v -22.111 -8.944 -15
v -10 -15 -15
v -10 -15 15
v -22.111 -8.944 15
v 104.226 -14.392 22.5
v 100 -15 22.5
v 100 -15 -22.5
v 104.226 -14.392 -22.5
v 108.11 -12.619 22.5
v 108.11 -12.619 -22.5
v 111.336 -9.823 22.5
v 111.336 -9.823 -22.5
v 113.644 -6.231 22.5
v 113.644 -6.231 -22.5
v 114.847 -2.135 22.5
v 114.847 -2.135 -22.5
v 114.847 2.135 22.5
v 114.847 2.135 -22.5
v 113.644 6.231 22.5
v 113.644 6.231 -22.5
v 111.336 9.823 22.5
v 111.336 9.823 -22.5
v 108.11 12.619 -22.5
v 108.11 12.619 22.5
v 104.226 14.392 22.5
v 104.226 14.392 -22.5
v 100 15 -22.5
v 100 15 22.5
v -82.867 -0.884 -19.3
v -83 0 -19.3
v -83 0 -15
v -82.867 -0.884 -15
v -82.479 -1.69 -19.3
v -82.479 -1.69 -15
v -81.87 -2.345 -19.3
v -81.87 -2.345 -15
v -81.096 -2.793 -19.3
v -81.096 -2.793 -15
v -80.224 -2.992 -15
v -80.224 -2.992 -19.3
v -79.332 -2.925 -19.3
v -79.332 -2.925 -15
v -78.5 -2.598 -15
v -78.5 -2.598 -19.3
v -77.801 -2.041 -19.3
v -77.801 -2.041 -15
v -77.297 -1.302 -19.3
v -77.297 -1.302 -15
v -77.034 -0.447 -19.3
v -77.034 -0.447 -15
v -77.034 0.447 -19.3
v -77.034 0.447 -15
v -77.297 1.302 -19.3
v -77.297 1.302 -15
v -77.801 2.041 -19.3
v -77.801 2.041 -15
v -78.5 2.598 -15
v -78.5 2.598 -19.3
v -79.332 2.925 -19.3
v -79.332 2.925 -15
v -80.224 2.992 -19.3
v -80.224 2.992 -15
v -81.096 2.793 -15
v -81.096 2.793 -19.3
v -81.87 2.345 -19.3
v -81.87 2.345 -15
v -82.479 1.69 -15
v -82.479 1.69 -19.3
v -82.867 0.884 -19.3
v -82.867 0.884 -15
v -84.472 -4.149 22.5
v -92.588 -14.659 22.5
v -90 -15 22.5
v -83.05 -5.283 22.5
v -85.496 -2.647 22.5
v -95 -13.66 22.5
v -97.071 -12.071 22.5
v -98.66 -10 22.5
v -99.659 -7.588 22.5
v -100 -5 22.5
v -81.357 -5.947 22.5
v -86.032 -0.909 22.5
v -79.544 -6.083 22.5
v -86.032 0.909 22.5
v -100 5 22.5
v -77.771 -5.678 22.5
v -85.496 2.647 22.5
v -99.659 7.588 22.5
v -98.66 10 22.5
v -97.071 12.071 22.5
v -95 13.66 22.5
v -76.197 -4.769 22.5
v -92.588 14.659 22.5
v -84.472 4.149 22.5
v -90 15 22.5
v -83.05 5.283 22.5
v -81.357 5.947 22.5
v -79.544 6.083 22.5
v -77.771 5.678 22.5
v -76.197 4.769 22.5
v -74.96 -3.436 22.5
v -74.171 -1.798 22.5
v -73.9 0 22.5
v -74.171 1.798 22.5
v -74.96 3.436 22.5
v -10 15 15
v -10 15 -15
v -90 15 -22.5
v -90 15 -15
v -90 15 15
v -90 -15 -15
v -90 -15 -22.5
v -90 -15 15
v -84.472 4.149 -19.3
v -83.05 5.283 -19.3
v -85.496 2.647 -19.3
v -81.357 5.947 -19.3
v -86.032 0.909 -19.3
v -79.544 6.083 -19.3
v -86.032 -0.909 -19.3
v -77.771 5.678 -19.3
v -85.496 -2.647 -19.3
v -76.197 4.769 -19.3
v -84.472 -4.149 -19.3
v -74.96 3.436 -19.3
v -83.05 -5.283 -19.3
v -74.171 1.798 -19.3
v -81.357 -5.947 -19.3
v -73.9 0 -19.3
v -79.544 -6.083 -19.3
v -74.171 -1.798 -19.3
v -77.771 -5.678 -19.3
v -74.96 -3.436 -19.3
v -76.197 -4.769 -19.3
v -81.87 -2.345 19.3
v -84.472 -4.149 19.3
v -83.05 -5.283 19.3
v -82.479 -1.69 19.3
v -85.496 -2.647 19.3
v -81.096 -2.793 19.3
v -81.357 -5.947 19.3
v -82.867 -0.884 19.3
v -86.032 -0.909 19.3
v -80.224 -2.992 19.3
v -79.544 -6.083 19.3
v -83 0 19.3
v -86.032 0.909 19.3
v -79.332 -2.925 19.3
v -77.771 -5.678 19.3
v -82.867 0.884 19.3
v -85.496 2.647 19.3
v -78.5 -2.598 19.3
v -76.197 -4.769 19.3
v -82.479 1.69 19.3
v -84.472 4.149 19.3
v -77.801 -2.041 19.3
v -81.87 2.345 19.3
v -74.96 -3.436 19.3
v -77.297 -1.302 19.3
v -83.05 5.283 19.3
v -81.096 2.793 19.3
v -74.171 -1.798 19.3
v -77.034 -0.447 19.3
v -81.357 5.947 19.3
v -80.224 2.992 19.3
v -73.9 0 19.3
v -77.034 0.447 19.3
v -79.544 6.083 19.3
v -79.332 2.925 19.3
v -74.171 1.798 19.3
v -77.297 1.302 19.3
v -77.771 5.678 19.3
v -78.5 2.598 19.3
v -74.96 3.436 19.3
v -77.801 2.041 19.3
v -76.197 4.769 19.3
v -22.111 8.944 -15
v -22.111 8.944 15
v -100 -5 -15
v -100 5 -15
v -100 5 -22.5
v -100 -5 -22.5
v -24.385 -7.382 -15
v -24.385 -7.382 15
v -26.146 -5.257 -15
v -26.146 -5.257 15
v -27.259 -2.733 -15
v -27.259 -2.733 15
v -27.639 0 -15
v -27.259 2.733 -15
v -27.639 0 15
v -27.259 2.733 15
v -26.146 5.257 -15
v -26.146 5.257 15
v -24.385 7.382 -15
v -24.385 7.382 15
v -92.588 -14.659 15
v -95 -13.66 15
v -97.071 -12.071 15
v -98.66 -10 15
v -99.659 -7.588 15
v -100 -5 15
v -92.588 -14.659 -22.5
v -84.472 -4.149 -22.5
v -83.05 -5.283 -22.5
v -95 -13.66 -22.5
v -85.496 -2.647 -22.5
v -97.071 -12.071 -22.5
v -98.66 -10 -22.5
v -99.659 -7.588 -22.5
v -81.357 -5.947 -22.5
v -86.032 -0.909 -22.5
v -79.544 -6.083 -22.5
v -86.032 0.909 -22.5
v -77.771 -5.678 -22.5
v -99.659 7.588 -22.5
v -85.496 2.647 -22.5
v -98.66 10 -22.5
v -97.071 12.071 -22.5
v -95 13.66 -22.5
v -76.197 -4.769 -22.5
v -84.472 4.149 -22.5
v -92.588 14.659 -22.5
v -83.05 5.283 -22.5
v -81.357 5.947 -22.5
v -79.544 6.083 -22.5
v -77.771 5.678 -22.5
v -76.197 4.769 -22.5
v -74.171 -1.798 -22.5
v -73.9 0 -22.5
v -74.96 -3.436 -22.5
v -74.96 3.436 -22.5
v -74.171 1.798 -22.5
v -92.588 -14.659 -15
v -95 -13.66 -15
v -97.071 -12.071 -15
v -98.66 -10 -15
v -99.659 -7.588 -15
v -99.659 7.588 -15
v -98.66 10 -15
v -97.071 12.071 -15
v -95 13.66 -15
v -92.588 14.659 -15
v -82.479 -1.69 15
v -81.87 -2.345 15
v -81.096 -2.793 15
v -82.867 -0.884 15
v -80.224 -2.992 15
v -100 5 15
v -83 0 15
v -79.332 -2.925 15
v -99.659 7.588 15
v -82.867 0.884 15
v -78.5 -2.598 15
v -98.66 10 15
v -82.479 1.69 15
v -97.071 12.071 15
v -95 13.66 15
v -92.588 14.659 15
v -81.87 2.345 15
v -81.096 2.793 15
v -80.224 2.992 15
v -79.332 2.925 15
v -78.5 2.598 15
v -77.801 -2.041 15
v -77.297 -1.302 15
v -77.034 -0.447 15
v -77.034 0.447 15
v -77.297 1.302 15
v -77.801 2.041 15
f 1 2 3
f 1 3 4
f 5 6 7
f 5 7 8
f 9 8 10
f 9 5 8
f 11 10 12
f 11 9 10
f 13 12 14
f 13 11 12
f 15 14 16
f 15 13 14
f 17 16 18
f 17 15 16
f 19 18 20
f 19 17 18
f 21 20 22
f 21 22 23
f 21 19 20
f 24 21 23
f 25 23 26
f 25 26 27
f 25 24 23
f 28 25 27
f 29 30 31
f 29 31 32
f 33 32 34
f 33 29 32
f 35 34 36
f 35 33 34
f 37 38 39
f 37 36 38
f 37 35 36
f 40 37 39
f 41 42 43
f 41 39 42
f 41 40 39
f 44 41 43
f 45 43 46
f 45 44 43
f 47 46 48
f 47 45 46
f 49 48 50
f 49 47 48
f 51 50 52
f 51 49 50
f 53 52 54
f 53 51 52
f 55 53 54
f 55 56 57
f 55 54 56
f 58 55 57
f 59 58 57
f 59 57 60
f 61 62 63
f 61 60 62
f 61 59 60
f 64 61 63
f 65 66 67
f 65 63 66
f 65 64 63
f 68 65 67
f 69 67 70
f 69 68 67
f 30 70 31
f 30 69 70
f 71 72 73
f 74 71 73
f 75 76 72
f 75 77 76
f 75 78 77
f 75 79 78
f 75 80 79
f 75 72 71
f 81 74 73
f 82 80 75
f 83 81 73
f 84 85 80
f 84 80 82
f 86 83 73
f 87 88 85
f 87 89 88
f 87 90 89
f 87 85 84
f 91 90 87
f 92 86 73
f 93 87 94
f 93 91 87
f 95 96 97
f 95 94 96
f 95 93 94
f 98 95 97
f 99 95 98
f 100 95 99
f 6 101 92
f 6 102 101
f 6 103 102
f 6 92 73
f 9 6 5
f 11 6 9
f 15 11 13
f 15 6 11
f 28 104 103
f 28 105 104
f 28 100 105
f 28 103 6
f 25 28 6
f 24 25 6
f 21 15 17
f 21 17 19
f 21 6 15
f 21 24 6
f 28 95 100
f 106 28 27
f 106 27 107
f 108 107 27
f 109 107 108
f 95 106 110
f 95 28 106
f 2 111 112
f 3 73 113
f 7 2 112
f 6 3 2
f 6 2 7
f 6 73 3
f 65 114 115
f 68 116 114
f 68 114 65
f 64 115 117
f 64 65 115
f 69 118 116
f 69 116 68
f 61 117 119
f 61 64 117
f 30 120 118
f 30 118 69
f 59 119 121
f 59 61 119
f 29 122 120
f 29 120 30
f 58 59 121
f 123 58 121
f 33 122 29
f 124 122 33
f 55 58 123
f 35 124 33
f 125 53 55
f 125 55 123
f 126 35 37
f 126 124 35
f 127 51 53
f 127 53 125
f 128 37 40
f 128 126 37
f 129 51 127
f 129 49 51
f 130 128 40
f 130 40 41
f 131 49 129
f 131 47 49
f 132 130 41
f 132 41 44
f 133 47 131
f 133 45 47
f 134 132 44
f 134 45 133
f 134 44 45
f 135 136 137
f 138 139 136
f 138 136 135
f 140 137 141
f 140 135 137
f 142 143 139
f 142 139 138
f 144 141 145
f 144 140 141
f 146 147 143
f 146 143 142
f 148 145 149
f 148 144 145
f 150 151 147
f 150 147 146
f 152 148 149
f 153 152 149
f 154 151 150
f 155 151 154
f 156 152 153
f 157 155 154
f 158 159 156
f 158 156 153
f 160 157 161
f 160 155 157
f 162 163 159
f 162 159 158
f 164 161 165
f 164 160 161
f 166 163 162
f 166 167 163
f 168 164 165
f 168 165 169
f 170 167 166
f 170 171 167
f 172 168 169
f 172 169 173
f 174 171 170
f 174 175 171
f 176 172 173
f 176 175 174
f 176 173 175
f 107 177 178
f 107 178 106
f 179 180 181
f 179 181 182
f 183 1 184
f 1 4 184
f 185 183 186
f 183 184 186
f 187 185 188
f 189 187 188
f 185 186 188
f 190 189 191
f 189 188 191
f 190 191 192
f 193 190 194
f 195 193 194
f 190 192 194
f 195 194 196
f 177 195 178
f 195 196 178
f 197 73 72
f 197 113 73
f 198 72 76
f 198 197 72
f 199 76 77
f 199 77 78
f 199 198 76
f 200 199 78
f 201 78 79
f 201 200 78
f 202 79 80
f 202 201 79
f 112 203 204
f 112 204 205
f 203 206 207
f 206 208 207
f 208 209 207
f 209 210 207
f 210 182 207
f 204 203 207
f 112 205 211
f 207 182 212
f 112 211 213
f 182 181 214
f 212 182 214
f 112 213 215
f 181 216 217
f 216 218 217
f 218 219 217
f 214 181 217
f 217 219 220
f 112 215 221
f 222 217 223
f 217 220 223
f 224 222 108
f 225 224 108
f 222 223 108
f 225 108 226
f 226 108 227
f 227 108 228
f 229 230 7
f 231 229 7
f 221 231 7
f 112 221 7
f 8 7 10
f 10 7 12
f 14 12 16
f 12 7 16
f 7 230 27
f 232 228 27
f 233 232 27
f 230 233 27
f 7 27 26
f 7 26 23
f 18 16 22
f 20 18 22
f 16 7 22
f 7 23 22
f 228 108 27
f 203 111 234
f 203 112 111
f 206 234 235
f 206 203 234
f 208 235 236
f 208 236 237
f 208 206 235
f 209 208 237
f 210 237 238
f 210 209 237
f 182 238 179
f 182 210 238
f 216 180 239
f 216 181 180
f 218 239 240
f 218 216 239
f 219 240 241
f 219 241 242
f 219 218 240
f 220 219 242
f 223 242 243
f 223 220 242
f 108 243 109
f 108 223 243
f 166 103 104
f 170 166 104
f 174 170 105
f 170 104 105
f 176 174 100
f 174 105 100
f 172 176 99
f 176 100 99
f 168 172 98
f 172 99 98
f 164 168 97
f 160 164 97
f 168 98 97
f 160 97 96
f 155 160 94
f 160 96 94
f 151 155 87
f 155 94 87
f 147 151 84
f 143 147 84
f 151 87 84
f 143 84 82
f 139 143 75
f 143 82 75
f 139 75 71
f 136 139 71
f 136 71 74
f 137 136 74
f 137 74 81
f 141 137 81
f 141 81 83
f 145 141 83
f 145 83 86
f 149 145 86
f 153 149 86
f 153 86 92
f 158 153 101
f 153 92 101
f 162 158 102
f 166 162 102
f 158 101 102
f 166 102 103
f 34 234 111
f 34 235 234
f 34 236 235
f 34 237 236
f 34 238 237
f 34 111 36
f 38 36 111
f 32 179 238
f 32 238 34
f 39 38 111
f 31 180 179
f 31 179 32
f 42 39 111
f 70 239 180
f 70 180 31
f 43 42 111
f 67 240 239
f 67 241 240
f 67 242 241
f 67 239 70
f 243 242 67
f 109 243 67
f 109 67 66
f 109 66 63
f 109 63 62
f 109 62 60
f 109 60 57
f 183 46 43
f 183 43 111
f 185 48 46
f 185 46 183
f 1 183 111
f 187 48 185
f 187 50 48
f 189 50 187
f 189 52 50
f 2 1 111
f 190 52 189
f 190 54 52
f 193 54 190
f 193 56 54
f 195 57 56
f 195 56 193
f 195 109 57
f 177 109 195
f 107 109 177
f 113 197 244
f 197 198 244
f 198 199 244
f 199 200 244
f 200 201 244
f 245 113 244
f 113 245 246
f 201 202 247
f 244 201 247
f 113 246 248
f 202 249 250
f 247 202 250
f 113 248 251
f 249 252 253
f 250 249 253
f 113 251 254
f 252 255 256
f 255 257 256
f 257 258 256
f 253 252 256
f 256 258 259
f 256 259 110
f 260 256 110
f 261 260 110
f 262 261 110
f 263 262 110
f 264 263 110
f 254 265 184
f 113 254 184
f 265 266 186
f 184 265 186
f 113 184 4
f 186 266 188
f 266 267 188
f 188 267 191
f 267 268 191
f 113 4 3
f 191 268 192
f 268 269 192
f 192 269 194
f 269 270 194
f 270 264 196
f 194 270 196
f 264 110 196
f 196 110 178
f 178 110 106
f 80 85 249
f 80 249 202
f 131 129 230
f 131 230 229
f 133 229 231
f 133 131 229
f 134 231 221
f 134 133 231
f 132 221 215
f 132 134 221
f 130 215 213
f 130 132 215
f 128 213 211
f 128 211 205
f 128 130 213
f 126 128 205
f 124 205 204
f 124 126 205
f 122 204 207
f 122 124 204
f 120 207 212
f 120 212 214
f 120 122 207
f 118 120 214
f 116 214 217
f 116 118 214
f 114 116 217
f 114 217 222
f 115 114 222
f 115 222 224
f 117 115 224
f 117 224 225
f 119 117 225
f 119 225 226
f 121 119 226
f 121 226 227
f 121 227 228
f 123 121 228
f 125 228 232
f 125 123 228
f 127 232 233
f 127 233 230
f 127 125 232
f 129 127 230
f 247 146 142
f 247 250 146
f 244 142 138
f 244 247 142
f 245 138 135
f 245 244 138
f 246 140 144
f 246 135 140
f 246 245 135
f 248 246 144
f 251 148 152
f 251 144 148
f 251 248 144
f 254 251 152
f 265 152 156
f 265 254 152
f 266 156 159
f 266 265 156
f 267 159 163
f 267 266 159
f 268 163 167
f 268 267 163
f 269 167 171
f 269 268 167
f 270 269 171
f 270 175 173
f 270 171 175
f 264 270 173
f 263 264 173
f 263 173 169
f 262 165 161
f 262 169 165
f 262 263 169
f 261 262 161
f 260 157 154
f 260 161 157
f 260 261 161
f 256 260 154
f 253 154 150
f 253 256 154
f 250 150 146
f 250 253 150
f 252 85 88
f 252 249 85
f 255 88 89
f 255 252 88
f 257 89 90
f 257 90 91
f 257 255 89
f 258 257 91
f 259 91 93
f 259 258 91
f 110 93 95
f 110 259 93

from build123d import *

# Parameters (mm, degrees)
SKETCH1_R           = 3
BOSS_EXTRUDE1_DEPTH = 22.5
SKETCH3_W           = 60
SKETCH3_H           = 30
CUT_EXTRUDE1_DEPTH  = 121.959704034
FILLET1_R           = 10
CUT_EXTRUDE2_DEPTH  = 30
CUT_EXTRUDE4_DEPTH  = 30
FILLET2_R           = 10
SKETCH6_R           = 6.1
CUT_EXTRUDE5_DEPTH  = 3.2
CUT_EXTRUDE6_START  = -3.2
SKETCH7_R           = 6.1
CUT_EXTRUDE6_DEPTH  = 3.2


with BuildPart() as part:
    # Sketch1 → Boss-Extrude1 (new, symmetric)
    with BuildSketch(Plane.XY):
        with BuildLine():
            Line((-100, -15), (100, -15))
            ThreePointArc((100, -15), (115, 0), (100, 15))
            Line((100, 15), (-100, 15))
            Line((-100, 15), (-100, -15))
        make_face()
        with Locations(Location((-80, 0, 0), (0, 0, 180))):
            Circle(SKETCH1_R, mode=Mode.SUBTRACT)
    extrude(amount=BOSS_EXTRUDE1_DEPTH, both=True)

    # Sketch3 → Cut-Extrude1 (cut, through all)
    with BuildSketch(Plane(origin=(0, 15, 0), x_dir=(1, 0, 0), z_dir=(0, 1, 0))):
        with Locations((-70, 0)):
            Rectangle(SKETCH3_W, SKETCH3_H)
    extrude(amount=-CUT_EXTRUDE1_DEPTH, mode=Mode.SUBTRACT)

    # Fillet1
    fillet1_edges = [part.edges().sort_by_distance(p)[0] for p in [
        (-100, -15, -18.75),
        (-100, 15, -18.75),
        (-100, -15, 18.75),
        (-100, 15, 18.75),
    ]]
    fillet(fillet1_edges, radius=FILLET1_R)

    # Sketch4 → Cut-Extrude2 (cut)
    with BuildSketch(Plane(origin=(0, 0, -15), x_dir=(-1, 0, 0), z_dir=(0, 0, -1))):
        Polygon((40, 15), (40, 0), (10, 15), align=None)
    extrude(amount=-CUT_EXTRUDE2_DEPTH, mode=Mode.SUBTRACT)

    # Sketch5 → Cut-Extrude4 (cut)
    with BuildSketch(Plane(origin=(0, 0, -15), x_dir=(-1, 0, 0), z_dir=(0, 0, -1))):
        Polygon((40, 0), (40, -15), (10, -15), align=None)
    extrude(amount=-CUT_EXTRUDE4_DEPTH, mode=Mode.SUBTRACT)

    # Fillet2
    fillet2_edges = [part.edges().sort_by_distance(p)[0] for p in [
        (-40, 0, 0),
    ]]
    fillet(fillet2_edges, radius=FILLET2_R)

    # Sketch6 → Cut-Extrude5 (cut)
    with BuildSketch(Plane.XY.offset(22.5)):
        with Locations((-80, 0)):
            Circle(SKETCH6_R)
    extrude(amount=-CUT_EXTRUDE5_DEPTH, mode=Mode.SUBTRACT)

    # Sketch7 → Cut-Extrude6 (cut)
    with BuildSketch(Plane(origin=(0, 0, -22.5), x_dir=(-1, 0, 0), z_dir=(0, 0, -1)).offset(CUT_EXTRUDE6_START)):
        with Locations(Location((80, 0, 0), (0, 0, 180))):
            Circle(SKETCH7_R)
    extrude(amount=CUT_EXTRUDE6_DEPTH, mode=Mode.SUBTRACT)


solid = part.part
